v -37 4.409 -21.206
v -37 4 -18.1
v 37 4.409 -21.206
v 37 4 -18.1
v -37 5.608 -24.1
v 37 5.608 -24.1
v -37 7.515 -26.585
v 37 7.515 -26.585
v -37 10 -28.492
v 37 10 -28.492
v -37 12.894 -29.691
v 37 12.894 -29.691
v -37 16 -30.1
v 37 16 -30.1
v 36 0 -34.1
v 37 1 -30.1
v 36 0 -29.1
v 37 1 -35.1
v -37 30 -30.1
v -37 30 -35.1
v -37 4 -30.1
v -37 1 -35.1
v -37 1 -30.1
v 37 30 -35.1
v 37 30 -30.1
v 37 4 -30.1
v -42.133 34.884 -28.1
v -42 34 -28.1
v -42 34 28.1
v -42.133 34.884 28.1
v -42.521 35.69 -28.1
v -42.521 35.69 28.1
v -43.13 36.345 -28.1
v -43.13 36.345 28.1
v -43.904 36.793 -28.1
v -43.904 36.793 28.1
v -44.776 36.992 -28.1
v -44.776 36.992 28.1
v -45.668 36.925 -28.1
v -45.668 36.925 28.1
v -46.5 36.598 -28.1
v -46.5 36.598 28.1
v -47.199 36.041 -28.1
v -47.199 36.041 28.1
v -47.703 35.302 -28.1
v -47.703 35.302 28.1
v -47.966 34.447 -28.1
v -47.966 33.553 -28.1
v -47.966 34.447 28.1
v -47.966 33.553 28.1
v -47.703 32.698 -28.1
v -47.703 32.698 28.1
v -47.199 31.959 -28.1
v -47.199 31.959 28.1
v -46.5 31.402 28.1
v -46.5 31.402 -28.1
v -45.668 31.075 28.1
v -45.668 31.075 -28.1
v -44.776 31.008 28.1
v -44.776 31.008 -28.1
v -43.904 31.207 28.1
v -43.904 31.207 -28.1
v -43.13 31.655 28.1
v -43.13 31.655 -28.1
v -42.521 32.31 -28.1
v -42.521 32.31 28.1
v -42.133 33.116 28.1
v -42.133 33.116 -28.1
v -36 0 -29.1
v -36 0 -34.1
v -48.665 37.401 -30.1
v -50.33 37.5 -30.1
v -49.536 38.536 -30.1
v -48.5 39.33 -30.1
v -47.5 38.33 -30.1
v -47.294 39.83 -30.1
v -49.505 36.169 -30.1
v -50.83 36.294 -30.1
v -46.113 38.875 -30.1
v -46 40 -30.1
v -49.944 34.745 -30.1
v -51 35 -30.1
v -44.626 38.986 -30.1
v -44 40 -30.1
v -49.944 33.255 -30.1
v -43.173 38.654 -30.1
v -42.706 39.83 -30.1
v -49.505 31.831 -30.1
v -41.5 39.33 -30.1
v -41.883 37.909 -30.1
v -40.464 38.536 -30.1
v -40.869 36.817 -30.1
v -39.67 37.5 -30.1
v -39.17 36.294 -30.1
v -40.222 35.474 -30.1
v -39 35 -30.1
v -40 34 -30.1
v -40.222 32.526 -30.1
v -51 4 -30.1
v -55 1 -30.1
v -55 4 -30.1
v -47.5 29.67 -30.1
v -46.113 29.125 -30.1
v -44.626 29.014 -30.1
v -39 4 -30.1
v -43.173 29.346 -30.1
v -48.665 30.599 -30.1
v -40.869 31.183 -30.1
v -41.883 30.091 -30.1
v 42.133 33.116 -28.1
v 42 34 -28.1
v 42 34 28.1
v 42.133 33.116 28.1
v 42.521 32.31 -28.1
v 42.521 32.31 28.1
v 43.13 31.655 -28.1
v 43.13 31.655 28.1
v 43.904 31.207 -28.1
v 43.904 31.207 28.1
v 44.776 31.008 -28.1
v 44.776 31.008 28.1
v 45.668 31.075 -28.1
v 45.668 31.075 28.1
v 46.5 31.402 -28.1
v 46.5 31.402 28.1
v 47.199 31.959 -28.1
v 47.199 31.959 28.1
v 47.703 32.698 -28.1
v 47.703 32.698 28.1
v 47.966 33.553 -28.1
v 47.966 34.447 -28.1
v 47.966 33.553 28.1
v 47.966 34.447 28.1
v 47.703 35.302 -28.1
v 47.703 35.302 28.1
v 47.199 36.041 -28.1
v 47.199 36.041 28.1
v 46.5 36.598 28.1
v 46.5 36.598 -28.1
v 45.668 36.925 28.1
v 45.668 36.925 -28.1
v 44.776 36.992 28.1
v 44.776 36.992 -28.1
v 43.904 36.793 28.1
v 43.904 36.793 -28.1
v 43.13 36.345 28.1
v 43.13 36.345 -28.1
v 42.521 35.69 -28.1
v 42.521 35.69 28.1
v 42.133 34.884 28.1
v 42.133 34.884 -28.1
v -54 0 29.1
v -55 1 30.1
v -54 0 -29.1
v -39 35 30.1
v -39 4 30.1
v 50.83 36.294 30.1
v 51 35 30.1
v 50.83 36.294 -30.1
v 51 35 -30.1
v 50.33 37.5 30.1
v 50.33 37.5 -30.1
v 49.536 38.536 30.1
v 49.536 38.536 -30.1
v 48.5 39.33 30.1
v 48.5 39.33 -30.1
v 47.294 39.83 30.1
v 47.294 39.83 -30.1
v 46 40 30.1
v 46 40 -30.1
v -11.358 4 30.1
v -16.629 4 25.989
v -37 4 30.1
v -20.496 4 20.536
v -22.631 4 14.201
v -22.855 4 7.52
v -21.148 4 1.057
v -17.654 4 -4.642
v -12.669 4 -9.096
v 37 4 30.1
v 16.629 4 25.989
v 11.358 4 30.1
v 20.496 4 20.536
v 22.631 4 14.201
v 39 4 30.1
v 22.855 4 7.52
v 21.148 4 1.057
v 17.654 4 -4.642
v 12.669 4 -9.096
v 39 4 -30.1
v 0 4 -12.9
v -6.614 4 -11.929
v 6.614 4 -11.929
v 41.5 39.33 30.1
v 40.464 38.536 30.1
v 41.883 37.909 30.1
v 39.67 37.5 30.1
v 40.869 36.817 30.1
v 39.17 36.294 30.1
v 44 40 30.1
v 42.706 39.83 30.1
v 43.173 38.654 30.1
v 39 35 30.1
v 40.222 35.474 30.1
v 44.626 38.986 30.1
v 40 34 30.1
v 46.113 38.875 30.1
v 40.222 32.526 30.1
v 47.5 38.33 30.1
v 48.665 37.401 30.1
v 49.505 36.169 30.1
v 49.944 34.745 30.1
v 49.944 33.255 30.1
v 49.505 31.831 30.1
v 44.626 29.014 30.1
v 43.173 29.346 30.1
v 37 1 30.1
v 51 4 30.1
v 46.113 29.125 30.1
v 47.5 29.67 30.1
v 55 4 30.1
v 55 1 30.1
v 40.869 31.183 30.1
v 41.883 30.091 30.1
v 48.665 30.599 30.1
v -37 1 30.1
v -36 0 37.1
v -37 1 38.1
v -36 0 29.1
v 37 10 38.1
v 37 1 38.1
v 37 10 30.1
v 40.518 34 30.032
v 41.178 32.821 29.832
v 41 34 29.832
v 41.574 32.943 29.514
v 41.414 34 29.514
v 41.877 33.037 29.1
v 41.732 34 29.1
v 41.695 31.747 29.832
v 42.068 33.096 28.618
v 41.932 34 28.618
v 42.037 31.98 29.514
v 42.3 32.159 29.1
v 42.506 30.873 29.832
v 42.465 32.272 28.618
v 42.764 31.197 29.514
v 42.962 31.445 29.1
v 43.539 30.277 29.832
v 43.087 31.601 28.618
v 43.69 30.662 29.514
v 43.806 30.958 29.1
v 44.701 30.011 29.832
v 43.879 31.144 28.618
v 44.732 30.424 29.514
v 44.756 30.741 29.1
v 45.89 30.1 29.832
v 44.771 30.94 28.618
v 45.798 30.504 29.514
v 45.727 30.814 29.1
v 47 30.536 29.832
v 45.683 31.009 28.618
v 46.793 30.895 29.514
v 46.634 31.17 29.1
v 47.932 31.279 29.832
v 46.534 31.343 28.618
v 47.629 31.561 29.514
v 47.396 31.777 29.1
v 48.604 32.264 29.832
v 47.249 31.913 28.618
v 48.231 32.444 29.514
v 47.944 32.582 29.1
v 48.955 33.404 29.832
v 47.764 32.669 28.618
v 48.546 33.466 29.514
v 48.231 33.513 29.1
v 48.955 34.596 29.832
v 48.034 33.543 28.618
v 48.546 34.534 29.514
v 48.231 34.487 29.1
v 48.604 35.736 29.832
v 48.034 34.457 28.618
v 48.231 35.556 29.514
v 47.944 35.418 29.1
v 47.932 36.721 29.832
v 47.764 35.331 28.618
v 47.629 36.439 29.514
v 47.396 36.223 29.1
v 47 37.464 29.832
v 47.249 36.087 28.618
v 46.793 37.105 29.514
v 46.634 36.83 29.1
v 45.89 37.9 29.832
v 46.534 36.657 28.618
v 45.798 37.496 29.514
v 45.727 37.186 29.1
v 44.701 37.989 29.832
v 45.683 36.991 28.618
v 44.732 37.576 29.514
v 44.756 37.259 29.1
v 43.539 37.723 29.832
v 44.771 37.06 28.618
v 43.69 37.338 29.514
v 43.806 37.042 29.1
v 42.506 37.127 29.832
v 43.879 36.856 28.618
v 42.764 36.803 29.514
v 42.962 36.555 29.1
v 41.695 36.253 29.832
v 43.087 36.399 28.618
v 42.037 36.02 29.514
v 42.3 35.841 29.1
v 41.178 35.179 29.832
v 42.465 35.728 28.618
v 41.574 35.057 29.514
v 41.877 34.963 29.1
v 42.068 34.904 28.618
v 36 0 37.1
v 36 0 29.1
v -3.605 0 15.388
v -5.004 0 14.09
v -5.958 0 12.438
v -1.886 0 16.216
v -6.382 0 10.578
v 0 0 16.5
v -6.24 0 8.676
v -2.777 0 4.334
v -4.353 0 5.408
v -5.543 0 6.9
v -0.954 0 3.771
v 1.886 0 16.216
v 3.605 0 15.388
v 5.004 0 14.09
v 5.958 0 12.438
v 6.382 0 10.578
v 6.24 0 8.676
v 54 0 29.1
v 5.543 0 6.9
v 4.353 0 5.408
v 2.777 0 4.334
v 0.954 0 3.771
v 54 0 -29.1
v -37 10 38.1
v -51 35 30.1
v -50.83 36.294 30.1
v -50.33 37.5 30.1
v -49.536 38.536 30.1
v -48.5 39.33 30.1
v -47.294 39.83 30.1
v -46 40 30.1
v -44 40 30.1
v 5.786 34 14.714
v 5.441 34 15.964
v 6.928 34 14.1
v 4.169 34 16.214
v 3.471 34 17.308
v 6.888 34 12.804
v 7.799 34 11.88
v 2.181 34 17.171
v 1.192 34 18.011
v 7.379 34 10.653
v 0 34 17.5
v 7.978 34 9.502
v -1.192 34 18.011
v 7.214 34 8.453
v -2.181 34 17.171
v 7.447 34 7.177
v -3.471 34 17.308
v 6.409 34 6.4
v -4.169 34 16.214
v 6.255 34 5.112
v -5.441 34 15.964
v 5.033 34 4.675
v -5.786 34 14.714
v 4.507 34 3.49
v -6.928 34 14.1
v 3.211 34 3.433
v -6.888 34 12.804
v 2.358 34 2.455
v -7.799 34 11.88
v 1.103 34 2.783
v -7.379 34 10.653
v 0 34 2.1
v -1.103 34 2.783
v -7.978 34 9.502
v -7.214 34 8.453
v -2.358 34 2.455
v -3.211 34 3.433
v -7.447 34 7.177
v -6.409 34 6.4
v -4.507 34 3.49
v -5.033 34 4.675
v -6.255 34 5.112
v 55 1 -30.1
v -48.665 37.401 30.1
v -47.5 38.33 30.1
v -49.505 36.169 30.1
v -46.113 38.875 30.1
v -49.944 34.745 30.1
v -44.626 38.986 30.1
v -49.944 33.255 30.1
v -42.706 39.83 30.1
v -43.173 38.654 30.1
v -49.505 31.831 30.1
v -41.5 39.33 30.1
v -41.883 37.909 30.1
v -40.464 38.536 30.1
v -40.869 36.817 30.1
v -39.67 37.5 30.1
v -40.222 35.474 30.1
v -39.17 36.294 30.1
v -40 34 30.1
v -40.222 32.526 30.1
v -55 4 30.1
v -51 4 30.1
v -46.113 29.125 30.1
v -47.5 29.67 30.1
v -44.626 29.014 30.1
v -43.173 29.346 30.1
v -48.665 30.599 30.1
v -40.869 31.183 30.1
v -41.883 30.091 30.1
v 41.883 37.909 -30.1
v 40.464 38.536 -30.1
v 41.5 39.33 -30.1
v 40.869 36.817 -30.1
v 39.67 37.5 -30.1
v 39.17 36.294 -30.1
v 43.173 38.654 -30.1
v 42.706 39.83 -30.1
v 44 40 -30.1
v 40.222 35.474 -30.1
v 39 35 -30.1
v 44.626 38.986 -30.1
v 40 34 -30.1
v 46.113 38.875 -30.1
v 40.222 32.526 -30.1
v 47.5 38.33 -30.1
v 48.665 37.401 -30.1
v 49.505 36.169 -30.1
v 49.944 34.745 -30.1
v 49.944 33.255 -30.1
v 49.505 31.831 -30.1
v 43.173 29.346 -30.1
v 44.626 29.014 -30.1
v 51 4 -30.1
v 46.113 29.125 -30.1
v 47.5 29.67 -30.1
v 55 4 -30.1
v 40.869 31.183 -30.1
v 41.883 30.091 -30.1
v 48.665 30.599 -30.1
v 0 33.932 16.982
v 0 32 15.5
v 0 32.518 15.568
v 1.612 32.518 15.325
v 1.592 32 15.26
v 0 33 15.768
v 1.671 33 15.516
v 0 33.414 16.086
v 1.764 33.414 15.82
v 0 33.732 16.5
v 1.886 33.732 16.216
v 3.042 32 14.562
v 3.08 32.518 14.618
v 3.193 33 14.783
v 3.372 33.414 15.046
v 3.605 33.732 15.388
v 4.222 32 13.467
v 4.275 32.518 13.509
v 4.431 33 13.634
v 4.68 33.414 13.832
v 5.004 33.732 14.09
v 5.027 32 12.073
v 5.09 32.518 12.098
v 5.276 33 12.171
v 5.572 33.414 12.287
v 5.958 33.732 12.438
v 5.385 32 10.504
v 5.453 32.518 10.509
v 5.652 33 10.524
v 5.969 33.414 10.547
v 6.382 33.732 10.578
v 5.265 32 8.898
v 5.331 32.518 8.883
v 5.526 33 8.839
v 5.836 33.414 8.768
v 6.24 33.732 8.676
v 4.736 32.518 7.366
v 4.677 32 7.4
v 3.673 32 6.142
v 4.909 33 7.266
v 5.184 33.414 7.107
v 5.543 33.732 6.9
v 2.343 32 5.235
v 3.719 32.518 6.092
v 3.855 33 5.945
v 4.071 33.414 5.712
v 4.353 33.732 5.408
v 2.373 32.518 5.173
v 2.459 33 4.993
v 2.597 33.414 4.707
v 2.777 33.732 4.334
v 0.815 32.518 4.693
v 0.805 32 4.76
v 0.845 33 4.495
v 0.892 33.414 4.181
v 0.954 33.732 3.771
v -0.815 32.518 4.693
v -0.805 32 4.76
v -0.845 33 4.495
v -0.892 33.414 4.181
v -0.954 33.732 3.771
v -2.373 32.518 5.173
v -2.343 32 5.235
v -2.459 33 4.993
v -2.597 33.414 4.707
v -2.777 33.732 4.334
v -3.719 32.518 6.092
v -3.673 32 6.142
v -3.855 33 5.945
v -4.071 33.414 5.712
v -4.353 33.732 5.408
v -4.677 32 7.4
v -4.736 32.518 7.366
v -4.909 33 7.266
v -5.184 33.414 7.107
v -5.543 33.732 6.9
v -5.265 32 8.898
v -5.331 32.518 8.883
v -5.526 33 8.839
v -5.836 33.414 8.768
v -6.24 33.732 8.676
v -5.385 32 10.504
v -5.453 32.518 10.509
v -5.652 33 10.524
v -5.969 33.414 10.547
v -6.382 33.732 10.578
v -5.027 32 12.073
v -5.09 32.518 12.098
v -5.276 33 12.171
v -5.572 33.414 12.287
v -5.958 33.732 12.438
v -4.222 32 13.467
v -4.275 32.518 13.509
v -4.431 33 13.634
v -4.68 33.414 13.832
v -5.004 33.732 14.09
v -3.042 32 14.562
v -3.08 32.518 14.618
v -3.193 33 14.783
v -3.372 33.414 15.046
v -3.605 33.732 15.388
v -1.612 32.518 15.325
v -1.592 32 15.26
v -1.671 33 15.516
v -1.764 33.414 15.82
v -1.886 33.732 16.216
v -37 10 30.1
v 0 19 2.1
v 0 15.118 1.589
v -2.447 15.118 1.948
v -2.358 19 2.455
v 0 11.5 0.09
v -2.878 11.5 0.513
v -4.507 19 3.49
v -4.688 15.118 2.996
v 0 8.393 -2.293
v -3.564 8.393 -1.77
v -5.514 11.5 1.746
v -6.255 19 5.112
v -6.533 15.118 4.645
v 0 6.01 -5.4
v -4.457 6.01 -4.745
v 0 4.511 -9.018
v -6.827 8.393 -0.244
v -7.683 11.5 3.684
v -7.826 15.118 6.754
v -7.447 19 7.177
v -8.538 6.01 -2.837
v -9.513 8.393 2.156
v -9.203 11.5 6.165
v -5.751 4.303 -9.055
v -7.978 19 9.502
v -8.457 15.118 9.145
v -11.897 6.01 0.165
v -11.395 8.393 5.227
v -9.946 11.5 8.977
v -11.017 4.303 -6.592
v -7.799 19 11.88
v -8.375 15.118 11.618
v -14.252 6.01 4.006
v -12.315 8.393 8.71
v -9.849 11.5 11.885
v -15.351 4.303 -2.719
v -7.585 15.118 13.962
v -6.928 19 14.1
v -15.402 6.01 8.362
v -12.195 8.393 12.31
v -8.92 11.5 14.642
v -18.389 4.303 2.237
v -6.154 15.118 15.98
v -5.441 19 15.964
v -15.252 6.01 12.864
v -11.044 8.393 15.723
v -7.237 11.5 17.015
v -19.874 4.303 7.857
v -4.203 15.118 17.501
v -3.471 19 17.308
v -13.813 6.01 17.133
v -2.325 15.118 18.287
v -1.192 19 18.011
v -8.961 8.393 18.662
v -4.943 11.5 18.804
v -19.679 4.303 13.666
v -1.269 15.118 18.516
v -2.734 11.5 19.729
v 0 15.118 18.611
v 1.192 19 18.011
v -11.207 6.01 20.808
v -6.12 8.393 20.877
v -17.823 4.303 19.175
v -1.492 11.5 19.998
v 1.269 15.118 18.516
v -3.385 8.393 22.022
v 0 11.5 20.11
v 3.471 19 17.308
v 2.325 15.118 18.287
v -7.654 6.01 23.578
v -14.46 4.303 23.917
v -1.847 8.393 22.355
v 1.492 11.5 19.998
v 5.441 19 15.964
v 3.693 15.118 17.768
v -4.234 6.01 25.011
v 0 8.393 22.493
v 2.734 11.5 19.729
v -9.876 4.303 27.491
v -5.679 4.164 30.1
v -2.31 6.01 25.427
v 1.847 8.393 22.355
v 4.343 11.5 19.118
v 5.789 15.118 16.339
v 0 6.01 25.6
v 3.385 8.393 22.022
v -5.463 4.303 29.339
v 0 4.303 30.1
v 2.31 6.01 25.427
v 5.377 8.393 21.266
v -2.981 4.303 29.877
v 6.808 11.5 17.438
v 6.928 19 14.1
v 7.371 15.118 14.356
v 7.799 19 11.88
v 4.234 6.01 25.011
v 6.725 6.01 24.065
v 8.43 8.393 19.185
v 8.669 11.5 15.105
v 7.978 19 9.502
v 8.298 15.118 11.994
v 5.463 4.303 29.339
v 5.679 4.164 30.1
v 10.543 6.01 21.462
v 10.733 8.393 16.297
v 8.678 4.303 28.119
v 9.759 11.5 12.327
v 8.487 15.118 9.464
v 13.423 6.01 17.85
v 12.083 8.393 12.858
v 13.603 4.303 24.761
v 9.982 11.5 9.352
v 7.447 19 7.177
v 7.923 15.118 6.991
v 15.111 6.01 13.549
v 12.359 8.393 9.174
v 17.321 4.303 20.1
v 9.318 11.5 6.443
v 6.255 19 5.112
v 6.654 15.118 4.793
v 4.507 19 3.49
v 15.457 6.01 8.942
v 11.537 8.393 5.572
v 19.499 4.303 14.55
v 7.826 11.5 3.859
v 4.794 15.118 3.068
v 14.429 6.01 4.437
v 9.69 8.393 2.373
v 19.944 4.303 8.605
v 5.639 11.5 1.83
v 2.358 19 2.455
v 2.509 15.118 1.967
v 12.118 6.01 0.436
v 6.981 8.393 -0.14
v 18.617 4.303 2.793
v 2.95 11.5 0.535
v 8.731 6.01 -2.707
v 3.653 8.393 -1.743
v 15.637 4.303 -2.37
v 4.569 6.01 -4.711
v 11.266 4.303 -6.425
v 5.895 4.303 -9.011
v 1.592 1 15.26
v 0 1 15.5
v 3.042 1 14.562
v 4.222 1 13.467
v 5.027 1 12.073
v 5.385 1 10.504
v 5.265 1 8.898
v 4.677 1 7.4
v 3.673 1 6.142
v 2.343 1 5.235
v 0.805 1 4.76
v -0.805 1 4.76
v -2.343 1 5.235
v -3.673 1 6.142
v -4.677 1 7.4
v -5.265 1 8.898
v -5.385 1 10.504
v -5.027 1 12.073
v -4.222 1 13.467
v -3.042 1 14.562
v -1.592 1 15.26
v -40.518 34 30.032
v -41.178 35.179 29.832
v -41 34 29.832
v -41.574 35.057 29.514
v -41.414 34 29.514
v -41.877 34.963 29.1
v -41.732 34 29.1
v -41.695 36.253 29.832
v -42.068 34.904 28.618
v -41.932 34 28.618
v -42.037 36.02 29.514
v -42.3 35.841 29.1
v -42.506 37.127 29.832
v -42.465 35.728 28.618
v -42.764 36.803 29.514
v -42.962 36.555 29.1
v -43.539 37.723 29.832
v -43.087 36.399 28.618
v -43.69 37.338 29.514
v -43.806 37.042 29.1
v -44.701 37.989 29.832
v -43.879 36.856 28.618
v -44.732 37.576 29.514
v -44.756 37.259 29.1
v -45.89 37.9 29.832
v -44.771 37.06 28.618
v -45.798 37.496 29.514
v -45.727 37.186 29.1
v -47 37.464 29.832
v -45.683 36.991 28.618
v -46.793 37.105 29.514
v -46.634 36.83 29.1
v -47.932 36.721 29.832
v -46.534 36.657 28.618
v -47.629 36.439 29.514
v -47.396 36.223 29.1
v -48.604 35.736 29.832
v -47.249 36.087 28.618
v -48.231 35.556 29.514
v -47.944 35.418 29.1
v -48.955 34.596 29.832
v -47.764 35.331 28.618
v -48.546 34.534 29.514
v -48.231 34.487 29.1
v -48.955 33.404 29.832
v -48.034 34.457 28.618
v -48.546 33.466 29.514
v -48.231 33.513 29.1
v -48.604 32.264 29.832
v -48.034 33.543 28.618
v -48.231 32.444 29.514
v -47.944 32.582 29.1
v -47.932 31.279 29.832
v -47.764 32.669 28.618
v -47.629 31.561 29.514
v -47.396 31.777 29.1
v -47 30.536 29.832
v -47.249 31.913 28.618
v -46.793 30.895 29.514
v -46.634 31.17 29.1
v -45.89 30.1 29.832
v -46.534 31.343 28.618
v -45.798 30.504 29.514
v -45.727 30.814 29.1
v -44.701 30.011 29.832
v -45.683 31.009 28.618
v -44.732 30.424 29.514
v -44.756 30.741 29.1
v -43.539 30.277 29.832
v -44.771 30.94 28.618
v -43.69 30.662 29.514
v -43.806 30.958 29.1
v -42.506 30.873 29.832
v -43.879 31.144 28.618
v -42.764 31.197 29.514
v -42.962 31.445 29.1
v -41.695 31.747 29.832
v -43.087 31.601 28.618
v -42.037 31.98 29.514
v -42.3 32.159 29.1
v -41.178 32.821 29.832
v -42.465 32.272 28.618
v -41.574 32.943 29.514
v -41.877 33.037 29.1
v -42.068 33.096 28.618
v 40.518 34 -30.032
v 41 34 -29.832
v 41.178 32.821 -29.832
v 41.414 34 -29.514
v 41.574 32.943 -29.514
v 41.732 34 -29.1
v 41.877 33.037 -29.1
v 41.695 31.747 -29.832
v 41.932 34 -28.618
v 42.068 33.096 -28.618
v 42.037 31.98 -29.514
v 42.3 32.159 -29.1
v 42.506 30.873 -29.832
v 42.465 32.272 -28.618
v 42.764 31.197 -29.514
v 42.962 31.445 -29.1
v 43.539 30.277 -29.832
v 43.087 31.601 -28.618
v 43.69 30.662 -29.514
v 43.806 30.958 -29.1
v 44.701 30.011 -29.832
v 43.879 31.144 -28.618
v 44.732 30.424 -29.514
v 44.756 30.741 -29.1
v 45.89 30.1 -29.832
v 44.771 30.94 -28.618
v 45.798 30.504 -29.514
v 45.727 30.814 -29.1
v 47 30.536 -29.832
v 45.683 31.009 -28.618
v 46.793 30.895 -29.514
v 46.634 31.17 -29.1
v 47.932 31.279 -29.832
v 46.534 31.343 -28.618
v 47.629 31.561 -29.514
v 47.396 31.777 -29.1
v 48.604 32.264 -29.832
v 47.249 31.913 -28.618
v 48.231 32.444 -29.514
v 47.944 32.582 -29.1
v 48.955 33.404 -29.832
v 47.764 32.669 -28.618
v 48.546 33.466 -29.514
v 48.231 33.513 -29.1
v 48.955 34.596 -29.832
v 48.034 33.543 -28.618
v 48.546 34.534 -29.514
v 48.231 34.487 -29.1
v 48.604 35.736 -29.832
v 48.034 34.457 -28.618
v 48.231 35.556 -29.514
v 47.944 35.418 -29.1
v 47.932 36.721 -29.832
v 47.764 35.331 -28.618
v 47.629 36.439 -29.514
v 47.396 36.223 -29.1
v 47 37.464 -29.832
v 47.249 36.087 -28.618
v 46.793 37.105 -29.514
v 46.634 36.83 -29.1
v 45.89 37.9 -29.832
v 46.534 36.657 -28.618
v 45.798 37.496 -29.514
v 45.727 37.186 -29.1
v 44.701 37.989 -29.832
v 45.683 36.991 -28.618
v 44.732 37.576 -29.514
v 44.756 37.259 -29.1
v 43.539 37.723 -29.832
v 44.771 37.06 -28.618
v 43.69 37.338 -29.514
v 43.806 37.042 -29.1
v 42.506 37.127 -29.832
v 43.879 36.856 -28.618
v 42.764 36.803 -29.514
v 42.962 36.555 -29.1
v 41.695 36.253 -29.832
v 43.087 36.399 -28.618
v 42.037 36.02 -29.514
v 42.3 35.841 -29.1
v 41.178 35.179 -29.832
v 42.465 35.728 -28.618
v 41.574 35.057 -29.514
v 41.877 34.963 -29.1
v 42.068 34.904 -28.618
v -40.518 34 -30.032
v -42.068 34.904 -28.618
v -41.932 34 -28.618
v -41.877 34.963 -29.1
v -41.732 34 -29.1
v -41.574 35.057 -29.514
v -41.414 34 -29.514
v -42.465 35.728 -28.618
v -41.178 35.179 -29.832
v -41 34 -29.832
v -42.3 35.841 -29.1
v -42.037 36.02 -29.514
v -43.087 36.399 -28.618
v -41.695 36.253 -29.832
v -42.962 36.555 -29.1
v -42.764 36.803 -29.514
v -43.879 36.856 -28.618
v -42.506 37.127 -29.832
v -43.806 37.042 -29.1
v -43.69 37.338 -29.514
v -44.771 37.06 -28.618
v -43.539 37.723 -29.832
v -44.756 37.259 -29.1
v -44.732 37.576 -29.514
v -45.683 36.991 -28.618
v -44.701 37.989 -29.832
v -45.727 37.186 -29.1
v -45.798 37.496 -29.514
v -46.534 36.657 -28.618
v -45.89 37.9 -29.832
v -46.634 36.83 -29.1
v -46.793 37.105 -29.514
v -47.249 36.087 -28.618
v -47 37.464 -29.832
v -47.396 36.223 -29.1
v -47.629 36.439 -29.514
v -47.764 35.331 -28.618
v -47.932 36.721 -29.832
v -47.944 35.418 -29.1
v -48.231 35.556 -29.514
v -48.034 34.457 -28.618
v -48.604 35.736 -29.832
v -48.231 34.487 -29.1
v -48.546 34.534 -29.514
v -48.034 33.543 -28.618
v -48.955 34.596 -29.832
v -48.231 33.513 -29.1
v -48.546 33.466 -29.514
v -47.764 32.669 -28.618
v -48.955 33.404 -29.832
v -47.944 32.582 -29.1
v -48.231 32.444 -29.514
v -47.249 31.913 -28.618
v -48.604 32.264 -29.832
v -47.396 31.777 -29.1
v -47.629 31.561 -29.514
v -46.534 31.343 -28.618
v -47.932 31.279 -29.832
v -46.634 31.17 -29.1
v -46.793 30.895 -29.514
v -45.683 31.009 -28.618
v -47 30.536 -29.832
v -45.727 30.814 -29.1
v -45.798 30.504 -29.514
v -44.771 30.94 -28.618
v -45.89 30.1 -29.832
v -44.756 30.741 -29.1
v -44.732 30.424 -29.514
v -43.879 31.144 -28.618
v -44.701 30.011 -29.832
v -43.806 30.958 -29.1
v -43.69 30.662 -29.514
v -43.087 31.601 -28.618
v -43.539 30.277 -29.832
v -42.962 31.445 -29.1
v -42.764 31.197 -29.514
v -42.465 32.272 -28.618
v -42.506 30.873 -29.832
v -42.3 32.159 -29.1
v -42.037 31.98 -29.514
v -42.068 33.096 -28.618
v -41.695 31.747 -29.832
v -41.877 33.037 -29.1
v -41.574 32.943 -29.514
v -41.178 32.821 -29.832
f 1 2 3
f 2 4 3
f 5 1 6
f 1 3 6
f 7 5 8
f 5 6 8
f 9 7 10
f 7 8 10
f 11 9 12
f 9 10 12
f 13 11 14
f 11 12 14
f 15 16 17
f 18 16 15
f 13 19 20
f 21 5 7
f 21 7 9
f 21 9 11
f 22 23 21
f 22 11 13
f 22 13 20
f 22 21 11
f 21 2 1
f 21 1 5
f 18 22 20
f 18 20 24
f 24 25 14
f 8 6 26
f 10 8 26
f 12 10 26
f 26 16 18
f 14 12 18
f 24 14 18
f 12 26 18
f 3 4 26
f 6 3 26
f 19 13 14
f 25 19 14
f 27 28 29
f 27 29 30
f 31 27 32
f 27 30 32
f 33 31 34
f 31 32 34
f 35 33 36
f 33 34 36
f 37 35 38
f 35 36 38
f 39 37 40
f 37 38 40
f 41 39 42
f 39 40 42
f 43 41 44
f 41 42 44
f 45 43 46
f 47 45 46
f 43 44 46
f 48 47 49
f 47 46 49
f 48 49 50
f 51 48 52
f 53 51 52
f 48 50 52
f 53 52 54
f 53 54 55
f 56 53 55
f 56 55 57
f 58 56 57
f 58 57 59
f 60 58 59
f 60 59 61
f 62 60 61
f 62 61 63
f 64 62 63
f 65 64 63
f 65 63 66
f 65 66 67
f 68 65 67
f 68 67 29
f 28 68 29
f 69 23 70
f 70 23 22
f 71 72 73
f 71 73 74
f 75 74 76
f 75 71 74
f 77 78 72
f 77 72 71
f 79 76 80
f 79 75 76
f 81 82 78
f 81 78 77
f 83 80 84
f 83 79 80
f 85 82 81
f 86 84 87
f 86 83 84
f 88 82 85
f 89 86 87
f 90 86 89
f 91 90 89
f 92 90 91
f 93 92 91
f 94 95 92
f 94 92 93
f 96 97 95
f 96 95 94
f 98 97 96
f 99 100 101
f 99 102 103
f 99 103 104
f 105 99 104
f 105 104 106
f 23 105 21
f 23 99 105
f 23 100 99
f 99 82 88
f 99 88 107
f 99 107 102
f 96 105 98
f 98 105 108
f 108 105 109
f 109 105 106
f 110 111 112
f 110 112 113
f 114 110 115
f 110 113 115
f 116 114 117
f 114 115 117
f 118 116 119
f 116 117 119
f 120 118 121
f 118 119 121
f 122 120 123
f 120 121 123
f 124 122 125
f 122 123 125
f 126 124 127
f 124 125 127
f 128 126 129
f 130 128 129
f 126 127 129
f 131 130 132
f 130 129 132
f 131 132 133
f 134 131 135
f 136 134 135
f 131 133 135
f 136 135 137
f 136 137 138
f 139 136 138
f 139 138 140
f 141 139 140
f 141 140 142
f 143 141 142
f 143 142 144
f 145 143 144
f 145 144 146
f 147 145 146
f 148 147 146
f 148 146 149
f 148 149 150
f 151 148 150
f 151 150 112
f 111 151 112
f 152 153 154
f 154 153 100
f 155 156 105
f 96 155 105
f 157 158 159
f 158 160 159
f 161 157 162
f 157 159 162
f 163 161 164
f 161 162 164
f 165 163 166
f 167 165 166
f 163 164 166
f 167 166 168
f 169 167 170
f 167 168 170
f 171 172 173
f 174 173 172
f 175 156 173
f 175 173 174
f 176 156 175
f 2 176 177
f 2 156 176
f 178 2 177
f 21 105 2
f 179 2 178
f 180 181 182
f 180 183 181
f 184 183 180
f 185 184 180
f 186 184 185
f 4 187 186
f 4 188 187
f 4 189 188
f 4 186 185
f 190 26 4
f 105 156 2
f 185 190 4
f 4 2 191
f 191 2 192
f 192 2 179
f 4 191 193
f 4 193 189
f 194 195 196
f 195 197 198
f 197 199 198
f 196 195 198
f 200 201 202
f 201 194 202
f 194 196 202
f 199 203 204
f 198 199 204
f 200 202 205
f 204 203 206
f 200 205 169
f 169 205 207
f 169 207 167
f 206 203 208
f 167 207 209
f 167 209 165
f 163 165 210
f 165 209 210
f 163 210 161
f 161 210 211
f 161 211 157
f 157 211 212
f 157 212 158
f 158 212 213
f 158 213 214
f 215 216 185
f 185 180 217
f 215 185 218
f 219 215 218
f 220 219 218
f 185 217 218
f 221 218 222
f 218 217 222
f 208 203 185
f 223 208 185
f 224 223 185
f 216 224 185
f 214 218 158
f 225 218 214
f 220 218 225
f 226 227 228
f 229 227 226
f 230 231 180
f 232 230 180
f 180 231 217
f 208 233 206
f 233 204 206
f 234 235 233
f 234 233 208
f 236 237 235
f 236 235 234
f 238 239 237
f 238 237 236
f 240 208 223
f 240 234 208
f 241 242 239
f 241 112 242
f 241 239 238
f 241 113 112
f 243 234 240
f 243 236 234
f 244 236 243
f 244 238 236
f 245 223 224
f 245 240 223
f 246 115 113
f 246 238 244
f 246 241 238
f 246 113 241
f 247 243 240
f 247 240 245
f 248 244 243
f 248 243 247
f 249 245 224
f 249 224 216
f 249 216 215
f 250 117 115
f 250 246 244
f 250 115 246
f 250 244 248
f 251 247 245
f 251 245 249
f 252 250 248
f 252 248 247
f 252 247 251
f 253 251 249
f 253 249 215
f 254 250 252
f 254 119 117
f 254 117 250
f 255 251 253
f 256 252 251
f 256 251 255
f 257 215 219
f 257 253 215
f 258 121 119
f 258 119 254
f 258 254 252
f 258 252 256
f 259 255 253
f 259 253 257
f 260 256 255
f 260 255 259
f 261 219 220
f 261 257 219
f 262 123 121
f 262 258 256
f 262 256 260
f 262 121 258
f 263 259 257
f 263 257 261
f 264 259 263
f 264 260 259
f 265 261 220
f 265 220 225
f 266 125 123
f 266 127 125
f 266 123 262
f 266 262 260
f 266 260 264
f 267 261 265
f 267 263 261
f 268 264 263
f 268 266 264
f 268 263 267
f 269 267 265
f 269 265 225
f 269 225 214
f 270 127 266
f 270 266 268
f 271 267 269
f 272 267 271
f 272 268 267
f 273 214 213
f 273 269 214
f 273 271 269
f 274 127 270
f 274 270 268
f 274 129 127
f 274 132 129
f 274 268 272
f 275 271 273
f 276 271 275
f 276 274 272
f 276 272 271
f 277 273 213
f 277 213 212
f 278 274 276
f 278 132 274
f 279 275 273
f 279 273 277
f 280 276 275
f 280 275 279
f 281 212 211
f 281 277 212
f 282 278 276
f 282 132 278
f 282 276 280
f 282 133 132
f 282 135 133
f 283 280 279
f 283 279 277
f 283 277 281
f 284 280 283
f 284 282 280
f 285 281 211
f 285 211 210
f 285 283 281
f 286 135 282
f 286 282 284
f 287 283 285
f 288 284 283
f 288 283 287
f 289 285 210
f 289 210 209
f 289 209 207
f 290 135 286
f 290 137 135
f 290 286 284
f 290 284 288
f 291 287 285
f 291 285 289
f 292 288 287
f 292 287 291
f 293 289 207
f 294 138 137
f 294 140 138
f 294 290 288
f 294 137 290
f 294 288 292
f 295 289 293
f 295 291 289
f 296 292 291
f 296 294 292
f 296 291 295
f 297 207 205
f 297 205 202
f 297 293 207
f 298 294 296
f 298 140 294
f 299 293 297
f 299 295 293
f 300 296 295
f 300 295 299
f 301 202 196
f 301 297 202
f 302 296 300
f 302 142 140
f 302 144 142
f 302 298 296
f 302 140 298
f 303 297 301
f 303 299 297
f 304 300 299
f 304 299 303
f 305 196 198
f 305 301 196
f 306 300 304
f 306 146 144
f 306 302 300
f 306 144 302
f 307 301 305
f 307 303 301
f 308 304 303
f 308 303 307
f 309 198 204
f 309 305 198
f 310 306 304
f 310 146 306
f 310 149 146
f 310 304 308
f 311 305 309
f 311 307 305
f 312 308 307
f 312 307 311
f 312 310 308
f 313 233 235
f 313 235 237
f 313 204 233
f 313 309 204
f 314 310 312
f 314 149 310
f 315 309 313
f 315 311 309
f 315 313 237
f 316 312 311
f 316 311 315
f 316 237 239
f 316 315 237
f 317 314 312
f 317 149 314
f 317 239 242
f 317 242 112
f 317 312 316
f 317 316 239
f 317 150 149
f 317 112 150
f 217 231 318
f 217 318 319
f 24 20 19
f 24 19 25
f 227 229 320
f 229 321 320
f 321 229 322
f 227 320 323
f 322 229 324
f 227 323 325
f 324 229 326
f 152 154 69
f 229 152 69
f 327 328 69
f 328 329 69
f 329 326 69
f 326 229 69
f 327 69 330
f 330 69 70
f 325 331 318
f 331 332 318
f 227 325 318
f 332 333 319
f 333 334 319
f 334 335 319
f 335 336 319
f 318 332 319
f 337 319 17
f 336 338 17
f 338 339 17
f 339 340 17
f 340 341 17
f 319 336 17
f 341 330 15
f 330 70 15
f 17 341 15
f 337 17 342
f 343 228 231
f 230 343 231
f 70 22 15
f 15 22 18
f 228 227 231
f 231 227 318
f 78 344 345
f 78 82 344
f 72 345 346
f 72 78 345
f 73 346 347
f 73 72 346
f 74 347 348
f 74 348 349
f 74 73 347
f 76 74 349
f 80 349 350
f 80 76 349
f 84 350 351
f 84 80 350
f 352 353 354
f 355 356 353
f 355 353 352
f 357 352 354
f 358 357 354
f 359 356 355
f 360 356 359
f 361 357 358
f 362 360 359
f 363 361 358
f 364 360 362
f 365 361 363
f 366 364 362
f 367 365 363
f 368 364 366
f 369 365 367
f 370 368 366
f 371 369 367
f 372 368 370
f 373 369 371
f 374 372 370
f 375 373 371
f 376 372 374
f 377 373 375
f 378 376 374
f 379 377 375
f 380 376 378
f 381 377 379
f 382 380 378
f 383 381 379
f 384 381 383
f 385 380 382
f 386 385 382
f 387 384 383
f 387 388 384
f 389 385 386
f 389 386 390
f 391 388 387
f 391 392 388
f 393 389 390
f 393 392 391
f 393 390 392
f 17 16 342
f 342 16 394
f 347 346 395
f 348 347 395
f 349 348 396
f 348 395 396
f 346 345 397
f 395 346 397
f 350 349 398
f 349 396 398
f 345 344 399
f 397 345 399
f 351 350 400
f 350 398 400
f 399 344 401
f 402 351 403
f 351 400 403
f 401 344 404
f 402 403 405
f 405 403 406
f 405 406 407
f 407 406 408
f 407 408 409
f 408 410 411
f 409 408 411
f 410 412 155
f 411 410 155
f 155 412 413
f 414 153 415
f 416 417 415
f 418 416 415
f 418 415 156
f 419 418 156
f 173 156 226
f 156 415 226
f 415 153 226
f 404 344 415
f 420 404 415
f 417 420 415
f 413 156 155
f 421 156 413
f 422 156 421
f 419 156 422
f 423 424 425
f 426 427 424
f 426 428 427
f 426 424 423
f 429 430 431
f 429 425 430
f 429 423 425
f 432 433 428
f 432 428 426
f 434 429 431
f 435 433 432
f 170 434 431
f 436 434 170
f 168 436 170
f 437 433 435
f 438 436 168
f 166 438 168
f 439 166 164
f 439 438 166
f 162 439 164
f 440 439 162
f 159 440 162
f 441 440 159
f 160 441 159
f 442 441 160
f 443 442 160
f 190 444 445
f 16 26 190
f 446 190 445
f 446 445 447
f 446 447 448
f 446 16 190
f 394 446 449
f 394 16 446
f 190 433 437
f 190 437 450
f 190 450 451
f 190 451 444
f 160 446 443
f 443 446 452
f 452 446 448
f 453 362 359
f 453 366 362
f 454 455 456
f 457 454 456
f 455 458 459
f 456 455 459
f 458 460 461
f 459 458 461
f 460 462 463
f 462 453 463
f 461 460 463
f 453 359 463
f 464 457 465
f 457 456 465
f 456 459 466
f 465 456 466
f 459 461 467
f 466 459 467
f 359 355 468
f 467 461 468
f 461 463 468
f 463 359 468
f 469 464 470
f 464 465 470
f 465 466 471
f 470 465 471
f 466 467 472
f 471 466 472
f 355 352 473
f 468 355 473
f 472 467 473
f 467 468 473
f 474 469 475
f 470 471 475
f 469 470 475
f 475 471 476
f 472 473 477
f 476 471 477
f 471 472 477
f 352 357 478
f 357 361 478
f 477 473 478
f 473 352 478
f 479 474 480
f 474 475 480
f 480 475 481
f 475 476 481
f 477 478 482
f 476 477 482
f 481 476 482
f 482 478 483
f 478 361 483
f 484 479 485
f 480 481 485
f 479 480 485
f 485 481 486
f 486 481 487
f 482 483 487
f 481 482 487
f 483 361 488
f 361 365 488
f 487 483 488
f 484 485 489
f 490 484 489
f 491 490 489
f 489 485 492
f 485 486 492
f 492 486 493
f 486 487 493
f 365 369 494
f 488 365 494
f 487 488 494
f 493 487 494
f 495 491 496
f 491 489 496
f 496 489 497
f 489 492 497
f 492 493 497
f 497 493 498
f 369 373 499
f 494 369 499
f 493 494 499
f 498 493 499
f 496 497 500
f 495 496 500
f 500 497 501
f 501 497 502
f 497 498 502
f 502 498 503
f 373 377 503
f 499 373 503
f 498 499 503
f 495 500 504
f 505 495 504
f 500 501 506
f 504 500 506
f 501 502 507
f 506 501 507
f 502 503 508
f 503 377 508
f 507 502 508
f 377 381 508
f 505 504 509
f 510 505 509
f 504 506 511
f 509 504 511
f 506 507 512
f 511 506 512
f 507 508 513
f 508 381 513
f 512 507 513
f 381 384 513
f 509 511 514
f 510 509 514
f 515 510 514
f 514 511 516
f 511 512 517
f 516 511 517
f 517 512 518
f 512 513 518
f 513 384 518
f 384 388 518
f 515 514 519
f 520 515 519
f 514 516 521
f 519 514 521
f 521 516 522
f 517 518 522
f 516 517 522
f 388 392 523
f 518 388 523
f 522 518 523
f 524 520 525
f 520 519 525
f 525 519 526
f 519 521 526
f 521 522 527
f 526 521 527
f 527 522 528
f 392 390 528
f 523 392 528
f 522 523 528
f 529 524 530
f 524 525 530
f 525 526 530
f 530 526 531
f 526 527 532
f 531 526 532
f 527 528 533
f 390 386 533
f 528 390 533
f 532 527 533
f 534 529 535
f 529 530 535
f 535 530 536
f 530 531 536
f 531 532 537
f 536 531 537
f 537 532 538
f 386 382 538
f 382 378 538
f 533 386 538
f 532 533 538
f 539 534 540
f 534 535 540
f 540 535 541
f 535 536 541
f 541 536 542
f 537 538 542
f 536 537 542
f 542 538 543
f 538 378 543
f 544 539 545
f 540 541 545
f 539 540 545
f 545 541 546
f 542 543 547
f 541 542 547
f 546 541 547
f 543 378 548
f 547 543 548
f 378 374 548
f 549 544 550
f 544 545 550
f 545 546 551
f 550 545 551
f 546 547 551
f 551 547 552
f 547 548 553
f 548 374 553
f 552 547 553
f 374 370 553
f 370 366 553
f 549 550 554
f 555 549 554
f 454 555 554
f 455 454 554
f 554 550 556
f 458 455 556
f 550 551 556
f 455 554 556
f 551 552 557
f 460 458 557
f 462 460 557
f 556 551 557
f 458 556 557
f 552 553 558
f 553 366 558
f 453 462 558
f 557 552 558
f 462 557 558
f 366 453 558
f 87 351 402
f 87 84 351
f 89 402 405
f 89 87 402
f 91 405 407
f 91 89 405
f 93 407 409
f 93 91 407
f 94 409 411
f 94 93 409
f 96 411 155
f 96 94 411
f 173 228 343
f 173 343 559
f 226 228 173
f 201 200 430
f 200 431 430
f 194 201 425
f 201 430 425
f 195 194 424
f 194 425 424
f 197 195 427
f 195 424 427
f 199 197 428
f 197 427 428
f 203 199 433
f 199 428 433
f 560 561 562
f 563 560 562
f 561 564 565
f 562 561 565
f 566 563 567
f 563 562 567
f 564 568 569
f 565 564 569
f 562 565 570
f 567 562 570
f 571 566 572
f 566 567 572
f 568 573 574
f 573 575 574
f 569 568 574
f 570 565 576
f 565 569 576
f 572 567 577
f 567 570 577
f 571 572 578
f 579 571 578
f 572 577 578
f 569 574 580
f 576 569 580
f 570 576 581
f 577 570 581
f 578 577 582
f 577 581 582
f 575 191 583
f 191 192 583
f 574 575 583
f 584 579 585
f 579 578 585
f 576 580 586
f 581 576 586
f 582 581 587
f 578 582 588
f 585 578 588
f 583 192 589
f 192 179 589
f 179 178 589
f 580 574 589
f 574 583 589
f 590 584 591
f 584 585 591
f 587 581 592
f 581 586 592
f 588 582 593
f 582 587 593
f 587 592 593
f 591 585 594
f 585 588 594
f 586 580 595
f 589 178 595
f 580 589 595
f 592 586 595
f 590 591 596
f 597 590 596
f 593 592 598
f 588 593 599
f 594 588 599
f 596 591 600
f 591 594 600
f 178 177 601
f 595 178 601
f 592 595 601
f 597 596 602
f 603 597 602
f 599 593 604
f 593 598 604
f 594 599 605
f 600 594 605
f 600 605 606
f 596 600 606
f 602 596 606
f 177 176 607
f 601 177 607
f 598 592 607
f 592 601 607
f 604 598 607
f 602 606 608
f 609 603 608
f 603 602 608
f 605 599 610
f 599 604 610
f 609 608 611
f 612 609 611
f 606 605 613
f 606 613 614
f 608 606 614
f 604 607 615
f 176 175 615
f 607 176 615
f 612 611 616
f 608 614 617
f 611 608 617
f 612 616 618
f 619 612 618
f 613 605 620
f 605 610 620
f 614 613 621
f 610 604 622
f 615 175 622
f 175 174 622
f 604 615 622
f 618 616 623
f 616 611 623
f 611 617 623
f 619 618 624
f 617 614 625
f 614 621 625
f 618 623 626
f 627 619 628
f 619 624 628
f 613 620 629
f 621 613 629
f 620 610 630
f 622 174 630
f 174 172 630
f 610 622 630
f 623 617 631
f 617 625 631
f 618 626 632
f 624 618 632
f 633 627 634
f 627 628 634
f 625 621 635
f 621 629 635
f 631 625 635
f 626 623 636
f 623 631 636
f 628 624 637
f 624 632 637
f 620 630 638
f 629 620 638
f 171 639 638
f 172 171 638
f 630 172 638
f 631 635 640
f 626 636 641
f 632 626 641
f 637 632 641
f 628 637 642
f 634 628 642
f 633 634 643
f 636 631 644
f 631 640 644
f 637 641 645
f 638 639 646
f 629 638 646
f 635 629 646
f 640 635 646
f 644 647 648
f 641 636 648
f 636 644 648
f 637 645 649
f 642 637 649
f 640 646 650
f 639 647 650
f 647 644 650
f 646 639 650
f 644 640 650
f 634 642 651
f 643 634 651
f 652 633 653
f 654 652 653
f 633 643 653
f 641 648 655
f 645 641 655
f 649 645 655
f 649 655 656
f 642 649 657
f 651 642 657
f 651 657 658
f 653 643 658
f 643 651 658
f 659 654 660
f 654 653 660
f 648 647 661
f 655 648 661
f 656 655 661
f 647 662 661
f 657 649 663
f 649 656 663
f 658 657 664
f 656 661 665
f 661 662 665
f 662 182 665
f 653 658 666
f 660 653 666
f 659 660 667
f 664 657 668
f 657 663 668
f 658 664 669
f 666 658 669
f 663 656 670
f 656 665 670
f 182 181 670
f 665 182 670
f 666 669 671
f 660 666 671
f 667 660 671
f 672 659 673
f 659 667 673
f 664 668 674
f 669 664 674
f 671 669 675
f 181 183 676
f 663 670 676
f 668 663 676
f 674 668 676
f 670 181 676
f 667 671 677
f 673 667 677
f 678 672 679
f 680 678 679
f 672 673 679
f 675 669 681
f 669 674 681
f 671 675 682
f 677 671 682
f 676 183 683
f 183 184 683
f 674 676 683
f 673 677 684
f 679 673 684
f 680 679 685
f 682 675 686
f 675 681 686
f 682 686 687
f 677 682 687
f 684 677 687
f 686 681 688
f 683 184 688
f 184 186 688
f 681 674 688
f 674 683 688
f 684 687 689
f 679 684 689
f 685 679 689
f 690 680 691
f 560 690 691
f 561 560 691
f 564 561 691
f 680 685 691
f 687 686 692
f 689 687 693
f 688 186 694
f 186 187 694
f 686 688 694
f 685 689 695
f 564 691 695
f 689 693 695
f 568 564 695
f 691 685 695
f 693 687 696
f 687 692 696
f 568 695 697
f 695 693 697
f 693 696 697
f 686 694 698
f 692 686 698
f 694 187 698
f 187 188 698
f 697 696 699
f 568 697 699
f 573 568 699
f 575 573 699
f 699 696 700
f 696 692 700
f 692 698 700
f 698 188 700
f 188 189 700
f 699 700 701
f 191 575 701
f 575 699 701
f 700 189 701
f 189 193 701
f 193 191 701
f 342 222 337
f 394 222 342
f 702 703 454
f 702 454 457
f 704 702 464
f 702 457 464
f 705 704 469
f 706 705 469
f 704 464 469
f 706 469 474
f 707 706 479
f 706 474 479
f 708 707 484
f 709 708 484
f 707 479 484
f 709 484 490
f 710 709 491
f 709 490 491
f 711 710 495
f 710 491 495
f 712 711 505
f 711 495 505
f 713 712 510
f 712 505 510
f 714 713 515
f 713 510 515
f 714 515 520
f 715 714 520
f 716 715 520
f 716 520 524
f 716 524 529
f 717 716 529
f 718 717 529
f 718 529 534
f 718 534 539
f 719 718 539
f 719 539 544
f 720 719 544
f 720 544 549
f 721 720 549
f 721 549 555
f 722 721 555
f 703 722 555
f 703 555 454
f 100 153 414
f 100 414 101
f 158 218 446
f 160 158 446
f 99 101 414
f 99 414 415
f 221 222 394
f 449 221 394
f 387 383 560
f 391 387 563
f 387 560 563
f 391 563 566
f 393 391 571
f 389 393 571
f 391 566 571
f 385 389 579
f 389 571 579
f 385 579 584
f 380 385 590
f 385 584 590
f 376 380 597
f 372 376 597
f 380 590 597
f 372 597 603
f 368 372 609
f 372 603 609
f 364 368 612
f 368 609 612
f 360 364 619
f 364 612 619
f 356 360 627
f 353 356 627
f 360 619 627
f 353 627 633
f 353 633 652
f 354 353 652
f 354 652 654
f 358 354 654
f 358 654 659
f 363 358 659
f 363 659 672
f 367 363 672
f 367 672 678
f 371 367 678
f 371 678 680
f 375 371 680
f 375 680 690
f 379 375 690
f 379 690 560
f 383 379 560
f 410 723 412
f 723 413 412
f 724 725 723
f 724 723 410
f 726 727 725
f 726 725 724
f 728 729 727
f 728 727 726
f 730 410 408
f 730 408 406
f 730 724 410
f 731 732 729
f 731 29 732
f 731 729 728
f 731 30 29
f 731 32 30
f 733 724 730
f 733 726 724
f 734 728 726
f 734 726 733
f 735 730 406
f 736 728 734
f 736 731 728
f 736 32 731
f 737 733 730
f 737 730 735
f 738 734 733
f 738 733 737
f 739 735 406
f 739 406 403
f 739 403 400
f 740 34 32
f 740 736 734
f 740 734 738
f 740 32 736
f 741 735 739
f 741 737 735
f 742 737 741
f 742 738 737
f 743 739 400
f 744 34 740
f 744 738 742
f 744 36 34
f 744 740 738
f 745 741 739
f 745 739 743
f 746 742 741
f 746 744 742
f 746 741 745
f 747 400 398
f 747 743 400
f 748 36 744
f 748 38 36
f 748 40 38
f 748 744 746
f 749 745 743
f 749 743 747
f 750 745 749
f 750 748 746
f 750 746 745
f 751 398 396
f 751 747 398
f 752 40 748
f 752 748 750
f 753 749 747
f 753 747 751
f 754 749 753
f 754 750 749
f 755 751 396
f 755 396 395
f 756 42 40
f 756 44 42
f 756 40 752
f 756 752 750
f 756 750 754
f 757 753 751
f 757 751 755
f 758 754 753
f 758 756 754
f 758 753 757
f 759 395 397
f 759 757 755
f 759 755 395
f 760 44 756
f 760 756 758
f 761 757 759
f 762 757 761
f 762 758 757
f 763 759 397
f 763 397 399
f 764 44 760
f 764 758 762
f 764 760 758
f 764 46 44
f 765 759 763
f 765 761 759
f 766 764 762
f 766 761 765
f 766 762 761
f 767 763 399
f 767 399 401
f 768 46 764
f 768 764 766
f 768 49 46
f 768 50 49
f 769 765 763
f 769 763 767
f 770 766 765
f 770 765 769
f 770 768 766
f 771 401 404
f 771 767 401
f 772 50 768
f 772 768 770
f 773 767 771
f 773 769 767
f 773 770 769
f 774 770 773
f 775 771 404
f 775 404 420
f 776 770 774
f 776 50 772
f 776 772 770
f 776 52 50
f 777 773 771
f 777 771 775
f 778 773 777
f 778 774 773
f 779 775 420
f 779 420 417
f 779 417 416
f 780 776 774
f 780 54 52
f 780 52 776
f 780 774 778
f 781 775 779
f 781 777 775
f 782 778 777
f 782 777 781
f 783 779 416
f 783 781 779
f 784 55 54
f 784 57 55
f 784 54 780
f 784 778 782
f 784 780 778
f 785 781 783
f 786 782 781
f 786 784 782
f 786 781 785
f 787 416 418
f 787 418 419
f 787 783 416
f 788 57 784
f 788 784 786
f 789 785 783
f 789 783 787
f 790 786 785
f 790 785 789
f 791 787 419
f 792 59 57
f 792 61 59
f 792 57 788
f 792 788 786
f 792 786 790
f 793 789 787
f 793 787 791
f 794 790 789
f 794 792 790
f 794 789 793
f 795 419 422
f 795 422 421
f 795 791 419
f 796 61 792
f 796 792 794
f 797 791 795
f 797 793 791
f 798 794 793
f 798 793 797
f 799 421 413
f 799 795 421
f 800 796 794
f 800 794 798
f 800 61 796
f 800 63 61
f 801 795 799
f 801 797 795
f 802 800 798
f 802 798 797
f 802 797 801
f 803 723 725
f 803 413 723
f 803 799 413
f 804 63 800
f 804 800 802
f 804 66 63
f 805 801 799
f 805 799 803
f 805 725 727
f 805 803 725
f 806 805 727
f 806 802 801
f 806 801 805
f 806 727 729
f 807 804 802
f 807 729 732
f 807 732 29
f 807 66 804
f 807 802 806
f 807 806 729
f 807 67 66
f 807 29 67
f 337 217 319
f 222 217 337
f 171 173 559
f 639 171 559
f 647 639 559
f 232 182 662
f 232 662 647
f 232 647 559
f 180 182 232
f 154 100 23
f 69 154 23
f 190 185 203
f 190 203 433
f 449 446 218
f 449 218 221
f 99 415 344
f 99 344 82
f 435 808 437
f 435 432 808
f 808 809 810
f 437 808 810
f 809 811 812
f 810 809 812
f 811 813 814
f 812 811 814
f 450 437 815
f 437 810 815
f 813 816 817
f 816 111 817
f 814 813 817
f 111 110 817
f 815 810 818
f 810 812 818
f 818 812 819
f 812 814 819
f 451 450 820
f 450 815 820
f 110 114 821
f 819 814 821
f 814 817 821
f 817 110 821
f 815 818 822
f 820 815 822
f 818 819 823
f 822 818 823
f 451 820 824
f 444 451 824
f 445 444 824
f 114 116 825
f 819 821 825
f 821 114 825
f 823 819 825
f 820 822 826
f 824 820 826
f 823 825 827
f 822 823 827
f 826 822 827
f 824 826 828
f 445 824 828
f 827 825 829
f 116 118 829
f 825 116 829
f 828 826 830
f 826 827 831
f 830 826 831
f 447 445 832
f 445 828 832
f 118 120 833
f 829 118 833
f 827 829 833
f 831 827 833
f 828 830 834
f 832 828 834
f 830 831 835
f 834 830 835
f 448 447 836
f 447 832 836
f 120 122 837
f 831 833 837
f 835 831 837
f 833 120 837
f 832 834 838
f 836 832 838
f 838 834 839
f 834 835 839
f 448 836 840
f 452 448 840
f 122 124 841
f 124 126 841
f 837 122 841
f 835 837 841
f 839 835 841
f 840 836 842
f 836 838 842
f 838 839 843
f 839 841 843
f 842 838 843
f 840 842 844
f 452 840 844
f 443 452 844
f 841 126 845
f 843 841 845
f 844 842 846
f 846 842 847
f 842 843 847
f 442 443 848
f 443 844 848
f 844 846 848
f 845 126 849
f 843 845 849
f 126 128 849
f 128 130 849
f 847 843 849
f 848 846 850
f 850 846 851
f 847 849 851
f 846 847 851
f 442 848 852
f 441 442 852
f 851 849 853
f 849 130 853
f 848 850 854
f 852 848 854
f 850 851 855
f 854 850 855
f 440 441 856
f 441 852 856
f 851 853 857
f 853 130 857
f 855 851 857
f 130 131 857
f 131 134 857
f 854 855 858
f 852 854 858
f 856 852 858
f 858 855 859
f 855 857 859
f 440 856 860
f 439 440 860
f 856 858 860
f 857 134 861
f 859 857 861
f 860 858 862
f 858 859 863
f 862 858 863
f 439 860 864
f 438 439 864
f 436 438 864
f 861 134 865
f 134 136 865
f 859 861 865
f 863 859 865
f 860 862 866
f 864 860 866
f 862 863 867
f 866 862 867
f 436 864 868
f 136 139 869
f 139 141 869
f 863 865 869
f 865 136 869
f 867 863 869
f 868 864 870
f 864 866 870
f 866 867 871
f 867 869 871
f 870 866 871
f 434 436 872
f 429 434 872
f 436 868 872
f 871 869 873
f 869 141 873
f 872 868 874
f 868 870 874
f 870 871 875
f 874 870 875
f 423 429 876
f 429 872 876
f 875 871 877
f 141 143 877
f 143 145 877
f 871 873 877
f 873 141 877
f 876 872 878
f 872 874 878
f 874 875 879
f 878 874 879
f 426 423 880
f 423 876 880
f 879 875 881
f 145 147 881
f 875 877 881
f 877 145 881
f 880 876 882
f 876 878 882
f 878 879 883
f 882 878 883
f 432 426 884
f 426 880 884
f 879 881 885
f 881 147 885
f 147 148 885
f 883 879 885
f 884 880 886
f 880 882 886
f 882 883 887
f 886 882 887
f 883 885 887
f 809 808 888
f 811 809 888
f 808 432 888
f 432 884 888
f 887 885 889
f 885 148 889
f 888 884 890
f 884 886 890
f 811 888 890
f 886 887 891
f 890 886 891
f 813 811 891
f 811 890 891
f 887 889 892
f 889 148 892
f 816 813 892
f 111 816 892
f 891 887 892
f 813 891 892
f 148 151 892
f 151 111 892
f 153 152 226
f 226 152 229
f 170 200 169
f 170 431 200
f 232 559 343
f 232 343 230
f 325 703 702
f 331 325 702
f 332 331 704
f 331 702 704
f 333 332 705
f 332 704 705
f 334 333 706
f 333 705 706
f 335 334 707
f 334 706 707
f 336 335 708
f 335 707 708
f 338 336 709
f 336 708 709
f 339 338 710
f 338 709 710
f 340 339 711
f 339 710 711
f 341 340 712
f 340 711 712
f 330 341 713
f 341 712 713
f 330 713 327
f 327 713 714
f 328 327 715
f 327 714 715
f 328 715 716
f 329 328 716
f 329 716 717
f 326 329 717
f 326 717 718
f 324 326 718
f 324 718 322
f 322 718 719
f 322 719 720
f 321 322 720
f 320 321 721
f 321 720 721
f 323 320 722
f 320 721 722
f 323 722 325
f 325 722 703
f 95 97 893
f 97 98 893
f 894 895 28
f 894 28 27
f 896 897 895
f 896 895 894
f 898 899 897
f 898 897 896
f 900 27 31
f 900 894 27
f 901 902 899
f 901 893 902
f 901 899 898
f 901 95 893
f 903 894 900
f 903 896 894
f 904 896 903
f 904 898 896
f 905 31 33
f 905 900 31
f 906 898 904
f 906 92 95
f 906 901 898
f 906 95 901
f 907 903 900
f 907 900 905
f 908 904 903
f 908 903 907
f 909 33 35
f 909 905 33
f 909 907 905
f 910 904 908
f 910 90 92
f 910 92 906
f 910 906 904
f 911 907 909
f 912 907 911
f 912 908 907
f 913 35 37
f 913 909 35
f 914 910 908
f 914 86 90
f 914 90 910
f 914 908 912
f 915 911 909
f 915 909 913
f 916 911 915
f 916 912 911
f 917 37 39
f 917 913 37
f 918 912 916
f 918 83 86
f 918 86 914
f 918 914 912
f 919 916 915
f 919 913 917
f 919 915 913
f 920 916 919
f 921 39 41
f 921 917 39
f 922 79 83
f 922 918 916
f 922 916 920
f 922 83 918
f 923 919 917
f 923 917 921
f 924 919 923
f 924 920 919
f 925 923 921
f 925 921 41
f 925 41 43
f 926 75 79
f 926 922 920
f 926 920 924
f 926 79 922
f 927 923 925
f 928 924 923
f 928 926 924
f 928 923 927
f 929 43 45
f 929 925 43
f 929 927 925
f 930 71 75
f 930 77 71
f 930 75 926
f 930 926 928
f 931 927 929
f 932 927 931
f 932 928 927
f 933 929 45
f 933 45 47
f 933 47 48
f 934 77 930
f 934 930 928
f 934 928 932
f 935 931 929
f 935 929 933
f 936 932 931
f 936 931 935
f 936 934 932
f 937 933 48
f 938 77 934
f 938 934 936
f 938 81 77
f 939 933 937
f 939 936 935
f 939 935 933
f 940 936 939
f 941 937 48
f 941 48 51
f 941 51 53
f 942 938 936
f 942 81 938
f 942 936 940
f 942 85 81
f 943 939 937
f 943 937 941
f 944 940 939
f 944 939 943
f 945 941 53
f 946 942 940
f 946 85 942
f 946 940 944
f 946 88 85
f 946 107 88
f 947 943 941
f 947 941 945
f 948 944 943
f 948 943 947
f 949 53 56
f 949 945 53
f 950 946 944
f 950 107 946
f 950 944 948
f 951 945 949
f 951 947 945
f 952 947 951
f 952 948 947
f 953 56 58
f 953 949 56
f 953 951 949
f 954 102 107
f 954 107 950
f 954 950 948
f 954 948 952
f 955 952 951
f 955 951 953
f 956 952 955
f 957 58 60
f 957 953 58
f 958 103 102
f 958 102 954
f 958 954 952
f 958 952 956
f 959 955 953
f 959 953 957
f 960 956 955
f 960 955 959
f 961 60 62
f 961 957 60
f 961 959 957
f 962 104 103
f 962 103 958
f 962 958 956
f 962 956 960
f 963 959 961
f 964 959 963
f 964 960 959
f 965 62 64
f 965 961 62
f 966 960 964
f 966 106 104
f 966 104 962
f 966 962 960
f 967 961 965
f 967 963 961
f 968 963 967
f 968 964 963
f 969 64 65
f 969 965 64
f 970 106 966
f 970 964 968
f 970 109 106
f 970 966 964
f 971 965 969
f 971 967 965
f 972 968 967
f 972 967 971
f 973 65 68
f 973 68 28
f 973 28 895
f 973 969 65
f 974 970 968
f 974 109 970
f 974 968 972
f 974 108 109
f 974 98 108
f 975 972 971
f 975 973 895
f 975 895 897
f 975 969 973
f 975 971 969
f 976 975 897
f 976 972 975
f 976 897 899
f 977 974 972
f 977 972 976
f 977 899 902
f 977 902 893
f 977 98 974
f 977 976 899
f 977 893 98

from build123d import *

# Parameters (mm, degrees)
SKETCH_1_W          = 110
SKETCH_1_H          = 60.2
EXTRUDE_1_DEPTH     = 4
SKETCH_2_W          = 12
SKETCH_2_H          = 60.2
EXTRUDE_2_DEPTH     = 36
SKETCH_4_R          = 3
CUT_EXTRUDE_1_DEPTH = 91.824225843
FILLET_1_R          = 5
SKETCH_5_R          = 8
EXTRUDE_3_DEPTH     = 30
SKETCH_6_R          = 5.4
CUT_EXTRUDE_2_DEPTH = 72.323278108
FILLET_3_R          = 2
SKETCH_8_W          = 74
SKETCH_8_H          = 5
EXTRUDE_4_DEPTH     = 30
SKETCH_8_3_W        = 74
SKETCH_8_3_H        = 8
EXTRUDE_5_DEPTH     = 10
CHAMFER_2_SIZE      = 1
FILLET_5_R          = 2
FILLET_6_R          = 12
FILLET_2_R          = 15


with BuildPart() as part:
    # Эскиз1 → Бобышка-Вытянуть1 (new body)
    with BuildSketch(Plane(origin=(0, 0, 0), x_dir=(1, 0, 0), z_dir=(0, 1, 0))):
        Rectangle(SKETCH_1_W, SKETCH_1_H)
    extrude(amount=EXTRUDE_1_DEPTH)

    # Эскиз2 → Бобышка-Вытянуть2 (add)
    with BuildSketch(Plane(origin=(0, 4, 0), x_dir=(1, 0, 0), z_dir=(0, 1, 0))):
        with Locations((-45, 0)):
            Rectangle(SKETCH_2_W, SKETCH_2_H)
        with Locations((45, 0)):
            Rectangle(SKETCH_2_W, SKETCH_2_H)
    extrude(amount=EXTRUDE_2_DEPTH)

    # Эскиз4 → Вырез-Вытянуть1 (cut, through all)
    with BuildSketch(Plane.XY.offset(30.1)):
        with Locations((-45, 34)):
            Circle(SKETCH_4_R)
        with Locations(Location((45, 34, 0), (0, 0, 180))):
            Circle(SKETCH_4_R)
    extrude(amount=-CUT_EXTRUDE_1_DEPTH, mode=Mode.SUBTRACT)

    # Скругление1
    fillet_1_edges = [part.edges().sort_by_distance(p)[0] for p in [
        (-39, 40, 0),
        (-51, 40, 0),
        (51, 40, 0),
        (39, 40, 0),
    ]]
    fillet(fillet_1_edges, radius=FILLET_1_R)

    # Эскиз5 → Бобышка-Вытянуть3 (add)
    with BuildSketch(Plane(origin=(0, 4, 0), x_dir=(1, 0, 0), z_dir=(0, 1, 0))):
        with Locations(Location((0, -10.1, 0), (0, 0, 90))):
            Circle(SKETCH_5_R)
    extrude(amount=EXTRUDE_3_DEPTH)

    # Эскиз6 → Вырез-Вытянуть2 (cut, through all)
    with BuildSketch(Plane(origin=(0, 34, 0), x_dir=(1, 0, 0), z_dir=(0, 1, 0))):
        with Locations(Location((0, -10.1, 0), (0, 0, 270))):
            Circle(SKETCH_6_R)
    extrude(amount=-CUT_EXTRUDE_2_DEPTH, mode=Mode.SUBTRACT)

    # Скругление3
    fillet_3_edges = [part.edges().sort_by_distance(p)[0] for p in [
        (0, 34, 4.7),
    ]]
    fillet(fillet_3_edges, radius=FILLET_3_R)

    # Эскиз8 → Бобышка-Вытянуть4 (add)
    with BuildSketch(Plane(origin=(0, 0, 0), x_dir=(1, 0, 0), z_dir=(0, 1, 0))):
        with Locations((0, 32.6)):
            Rectangle(SKETCH_8_W, SKETCH_8_H)
    extrude(amount=EXTRUDE_4_DEPTH)

    # Эскиз8<3> → Бобышка-Вытянуть5 (add)
    with BuildSketch(Plane(origin=(0, 0, 0), x_dir=(1, 0, 0), z_dir=(0, 1, 0))):
        with Locations((0, -34.1)):
            Rectangle(SKETCH_8_3_W, SKETCH_8_3_H)
    extrude(amount=EXTRUDE_5_DEPTH)

    # Фаска2
    chamfer_2_edges = [part.edges().sort_by_distance(p)[0] for p in [
        (46, 0, 30.1),
        (-37, 0, 34.1),
        (0, 0, 38.1),
        (37, 0, 34.1),
        (-46, 0, 30.1),
        (-55, 0, 0),
        (46, 0, -30.1),
        (55, 0, 0),
        (0, 0, 4.7),
        (-46, 0, -30.1),
        (37, 0, -32.6),
        (-37, 0, -32.6),
        (0, 0, -35.1),
    ]]
    chamfer(chamfer_2_edges, length=CHAMFER_2_SIZE)

    # Скругление5
    fillet_5_edges = [part.edges().sort_by_distance(p)[0] for p in [
        (-48, 34, -30.1),
        (-48, 34, 30.1),
        (48, 34, -30.1),
        (48, 34, 30.1),
    ]]
    fillet(fillet_5_edges, radius=FILLET_5_R)

    # Скругление6
    fillet_6_edges = [part.edges().sort_by_distance(p)[0] for p in [
        (0, 4, -30.1),
    ]]
    fillet(fillet_6_edges, radius=FILLET_6_R)

    # Скругление2
    # the kernel refuses this fillet: 15 mm, written as the material it adds along each edge
    with BuildSketch(Plane(origin=(0, 4, 10.1), x_dir=(0, 0, -1), z_dir=(1, 0, 0))) as fillet_2_piece_1:
        with BuildLine():
            CenterArc((8 + FILLET_2_R, FILLET_2_R), FILLET_2_R, 180, 90)
            Line((8, FILLET_2_R), (8, 0))
            Line((8, 0), (8 + FILLET_2_R, 0))
        make_face()
    revolve(axis=Axis((0, 4, 10.1), (0, 1, 0)))


solid = part.part
